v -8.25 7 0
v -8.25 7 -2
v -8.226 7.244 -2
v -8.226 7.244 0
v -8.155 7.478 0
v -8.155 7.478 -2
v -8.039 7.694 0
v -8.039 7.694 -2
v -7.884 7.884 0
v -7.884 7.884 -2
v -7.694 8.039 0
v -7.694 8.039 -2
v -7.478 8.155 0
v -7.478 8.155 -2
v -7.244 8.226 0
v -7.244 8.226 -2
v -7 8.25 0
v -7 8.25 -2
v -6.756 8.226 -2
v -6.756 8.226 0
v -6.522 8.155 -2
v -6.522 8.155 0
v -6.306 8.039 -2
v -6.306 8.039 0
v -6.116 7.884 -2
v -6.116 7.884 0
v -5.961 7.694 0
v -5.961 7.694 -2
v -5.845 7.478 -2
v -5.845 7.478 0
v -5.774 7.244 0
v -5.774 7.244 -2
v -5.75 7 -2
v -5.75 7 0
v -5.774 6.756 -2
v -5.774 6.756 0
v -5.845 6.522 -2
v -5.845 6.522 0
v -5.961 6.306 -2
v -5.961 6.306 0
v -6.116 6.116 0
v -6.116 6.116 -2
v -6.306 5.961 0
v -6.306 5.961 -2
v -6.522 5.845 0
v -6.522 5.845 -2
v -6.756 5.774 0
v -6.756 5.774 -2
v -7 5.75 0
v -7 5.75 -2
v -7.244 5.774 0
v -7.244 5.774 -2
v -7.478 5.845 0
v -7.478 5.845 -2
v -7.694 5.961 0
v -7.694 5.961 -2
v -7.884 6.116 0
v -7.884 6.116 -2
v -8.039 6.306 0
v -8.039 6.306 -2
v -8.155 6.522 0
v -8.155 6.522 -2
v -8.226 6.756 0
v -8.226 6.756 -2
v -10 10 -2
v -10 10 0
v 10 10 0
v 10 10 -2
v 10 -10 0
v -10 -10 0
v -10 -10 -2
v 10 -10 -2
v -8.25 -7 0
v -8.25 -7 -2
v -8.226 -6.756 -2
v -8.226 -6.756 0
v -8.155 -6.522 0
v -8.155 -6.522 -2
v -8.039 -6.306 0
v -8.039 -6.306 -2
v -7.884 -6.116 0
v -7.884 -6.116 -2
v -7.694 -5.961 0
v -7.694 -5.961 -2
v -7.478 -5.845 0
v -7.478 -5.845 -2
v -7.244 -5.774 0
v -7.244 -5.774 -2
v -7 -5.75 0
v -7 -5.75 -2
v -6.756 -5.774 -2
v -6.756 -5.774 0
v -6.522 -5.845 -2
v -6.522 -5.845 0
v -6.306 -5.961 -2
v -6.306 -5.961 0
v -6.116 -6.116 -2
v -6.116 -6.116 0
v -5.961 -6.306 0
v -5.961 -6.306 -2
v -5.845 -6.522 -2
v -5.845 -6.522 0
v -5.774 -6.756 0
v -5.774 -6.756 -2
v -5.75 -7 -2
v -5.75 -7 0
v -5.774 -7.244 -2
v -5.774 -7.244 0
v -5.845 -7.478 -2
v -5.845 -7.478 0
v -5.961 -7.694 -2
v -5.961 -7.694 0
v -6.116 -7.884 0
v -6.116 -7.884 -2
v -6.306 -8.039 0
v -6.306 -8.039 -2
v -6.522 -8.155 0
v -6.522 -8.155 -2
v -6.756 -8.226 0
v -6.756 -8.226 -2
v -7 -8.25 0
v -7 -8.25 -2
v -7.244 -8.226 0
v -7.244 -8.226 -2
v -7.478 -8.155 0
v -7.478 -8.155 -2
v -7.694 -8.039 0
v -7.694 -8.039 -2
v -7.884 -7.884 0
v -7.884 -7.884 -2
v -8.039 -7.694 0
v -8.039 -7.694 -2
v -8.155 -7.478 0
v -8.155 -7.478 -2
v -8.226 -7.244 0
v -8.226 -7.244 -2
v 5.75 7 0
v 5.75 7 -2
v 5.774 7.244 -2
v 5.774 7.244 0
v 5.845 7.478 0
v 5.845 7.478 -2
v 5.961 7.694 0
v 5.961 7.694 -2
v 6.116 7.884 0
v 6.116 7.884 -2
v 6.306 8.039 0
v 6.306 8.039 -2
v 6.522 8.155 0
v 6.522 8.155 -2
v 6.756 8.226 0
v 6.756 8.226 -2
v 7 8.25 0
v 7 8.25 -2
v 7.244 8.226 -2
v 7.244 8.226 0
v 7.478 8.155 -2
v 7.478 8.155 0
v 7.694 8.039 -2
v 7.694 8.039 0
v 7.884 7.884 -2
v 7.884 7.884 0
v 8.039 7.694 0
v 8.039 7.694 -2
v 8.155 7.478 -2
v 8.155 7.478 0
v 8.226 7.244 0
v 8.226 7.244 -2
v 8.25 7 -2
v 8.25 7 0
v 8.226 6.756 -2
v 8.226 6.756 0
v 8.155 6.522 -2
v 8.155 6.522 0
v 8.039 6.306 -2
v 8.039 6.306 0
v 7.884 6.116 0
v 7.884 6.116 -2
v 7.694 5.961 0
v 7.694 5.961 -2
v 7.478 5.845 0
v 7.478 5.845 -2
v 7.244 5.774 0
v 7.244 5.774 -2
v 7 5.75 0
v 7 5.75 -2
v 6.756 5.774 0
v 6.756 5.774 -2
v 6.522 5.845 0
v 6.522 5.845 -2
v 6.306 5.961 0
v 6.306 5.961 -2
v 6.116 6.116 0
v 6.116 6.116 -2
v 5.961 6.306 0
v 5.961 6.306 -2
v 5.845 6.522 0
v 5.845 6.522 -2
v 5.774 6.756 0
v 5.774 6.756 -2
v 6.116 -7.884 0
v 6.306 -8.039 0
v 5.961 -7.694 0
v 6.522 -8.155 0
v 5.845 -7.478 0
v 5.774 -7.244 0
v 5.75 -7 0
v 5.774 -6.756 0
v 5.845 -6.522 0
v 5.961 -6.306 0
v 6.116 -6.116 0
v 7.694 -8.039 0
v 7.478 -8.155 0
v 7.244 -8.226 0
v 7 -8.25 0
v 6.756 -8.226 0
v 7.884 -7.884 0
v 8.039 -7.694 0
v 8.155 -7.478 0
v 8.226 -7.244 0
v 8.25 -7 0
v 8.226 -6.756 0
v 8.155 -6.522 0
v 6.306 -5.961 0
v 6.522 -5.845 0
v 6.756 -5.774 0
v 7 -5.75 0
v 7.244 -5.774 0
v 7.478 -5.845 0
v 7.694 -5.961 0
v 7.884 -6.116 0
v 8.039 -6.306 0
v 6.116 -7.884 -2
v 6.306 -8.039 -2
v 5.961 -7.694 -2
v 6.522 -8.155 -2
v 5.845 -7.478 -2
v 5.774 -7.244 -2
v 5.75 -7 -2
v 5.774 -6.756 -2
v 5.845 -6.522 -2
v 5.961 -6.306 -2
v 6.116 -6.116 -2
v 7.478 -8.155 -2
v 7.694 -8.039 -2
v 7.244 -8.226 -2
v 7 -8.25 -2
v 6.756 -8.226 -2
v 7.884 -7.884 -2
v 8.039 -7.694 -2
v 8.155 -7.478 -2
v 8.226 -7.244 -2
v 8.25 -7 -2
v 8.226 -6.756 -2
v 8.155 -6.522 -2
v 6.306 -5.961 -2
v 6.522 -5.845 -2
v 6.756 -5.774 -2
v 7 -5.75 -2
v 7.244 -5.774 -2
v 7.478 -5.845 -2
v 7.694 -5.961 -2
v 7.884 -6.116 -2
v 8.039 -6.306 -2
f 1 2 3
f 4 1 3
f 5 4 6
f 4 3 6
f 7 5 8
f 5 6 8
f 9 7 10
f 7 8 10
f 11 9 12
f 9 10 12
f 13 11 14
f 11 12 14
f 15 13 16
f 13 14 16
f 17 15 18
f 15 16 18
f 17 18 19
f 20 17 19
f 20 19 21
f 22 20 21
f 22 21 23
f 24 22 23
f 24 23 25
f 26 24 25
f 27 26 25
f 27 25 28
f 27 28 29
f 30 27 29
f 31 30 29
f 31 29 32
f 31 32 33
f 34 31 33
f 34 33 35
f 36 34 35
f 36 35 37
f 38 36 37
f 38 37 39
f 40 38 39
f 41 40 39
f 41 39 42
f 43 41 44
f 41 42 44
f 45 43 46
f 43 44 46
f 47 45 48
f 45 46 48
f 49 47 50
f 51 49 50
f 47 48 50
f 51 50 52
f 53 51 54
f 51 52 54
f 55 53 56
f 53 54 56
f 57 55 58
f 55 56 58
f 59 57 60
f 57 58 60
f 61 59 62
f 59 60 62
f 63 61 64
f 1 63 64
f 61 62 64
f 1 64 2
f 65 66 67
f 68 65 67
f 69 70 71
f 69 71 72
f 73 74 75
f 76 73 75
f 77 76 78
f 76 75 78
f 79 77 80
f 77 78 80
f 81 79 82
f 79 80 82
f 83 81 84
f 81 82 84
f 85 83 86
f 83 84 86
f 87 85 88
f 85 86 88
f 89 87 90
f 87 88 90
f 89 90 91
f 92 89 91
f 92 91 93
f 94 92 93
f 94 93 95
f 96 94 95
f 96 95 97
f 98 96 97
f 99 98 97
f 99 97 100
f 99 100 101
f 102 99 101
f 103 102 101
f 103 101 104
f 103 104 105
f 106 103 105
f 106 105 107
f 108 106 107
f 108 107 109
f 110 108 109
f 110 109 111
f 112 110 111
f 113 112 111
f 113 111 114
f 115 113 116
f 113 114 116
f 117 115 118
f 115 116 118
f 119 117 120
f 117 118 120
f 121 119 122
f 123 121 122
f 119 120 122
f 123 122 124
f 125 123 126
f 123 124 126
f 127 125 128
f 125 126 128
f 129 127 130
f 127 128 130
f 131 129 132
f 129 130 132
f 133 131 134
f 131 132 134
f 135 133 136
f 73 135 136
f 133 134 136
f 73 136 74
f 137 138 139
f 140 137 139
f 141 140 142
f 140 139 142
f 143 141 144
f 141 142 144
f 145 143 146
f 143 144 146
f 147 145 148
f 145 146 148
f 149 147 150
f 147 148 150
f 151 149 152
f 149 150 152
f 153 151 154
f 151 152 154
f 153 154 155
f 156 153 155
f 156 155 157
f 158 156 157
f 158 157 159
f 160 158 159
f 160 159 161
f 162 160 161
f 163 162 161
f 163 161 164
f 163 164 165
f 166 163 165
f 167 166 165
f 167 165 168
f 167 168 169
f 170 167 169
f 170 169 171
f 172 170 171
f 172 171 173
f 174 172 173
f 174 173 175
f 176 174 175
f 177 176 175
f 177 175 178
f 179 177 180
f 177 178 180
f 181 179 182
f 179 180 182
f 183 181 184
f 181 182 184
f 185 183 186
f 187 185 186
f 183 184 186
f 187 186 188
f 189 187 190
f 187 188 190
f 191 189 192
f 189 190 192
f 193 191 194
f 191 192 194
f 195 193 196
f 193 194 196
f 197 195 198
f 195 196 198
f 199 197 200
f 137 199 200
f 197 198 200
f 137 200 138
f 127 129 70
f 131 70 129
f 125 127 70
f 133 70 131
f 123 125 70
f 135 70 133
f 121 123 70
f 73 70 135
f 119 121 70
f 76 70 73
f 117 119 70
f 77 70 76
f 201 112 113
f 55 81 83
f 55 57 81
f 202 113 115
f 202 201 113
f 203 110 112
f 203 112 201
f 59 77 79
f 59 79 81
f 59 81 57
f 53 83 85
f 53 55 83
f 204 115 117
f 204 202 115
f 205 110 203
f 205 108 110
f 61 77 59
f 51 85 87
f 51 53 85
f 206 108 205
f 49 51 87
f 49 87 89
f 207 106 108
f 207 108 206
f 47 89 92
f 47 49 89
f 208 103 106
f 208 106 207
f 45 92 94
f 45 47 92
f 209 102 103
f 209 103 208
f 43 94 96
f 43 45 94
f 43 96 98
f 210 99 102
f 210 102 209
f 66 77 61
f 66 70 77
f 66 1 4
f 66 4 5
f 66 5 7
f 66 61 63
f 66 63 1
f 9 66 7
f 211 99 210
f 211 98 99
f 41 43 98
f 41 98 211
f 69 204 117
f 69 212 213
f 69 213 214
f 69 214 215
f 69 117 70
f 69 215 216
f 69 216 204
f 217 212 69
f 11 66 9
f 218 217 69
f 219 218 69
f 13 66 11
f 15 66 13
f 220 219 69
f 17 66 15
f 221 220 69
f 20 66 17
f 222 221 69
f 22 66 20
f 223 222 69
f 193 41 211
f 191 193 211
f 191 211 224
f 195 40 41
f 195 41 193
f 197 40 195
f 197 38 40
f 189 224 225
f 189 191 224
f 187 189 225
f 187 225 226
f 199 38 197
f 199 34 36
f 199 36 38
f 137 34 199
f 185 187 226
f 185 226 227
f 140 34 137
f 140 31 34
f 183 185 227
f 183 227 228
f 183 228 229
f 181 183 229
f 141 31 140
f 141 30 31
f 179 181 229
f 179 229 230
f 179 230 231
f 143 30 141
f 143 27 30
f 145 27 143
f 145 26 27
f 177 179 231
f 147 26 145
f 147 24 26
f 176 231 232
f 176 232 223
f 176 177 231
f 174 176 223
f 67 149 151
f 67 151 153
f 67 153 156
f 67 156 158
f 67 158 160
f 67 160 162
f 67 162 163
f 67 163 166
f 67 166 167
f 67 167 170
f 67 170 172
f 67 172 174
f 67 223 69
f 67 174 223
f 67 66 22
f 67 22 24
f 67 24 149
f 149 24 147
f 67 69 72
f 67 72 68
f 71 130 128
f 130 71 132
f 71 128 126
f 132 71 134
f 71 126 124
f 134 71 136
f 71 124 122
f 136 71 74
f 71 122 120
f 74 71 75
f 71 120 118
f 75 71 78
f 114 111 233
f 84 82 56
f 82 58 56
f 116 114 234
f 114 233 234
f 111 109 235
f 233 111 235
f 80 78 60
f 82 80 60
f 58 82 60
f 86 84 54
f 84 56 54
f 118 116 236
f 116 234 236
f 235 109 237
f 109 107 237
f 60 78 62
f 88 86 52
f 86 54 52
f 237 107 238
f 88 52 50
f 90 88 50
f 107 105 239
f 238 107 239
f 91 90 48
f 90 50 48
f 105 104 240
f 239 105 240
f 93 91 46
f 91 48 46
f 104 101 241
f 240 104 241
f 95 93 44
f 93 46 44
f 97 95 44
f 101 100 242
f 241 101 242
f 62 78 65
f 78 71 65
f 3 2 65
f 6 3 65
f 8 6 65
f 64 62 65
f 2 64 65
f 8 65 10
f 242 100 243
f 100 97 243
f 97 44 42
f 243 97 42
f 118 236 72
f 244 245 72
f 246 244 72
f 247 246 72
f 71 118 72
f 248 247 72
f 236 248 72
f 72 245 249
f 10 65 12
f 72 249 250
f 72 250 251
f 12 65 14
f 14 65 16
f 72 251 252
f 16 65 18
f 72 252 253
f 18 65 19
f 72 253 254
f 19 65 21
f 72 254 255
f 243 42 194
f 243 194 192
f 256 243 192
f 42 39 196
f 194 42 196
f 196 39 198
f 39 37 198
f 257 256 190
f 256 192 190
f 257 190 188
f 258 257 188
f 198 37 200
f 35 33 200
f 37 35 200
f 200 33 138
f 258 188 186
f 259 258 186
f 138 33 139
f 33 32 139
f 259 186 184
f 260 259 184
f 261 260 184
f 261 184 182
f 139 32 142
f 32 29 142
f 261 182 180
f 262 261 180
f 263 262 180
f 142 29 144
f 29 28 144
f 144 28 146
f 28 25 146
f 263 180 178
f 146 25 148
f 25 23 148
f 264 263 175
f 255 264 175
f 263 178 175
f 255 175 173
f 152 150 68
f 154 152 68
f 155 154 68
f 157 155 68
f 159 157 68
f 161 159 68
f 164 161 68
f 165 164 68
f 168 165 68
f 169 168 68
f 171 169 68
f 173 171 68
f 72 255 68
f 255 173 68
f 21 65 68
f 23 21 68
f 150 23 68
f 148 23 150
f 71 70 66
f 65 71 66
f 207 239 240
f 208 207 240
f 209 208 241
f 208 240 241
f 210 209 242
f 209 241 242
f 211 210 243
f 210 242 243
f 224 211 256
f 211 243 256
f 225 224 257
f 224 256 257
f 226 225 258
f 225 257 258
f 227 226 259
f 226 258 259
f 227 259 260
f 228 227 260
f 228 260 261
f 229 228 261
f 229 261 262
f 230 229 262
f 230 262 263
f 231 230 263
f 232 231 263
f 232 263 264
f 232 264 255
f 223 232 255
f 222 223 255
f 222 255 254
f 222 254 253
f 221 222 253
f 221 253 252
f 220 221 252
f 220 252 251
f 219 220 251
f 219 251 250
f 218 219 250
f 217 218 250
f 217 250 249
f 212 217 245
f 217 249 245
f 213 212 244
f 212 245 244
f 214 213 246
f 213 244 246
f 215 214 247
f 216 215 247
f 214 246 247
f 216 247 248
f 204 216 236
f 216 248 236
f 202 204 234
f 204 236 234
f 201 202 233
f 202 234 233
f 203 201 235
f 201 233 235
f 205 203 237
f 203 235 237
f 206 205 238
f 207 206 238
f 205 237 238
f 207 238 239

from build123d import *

# Parameters (mm, degrees)
F0_W     = 20
F0_H     = 20
F1_DEPTH = 2
F3_D     = 2.5


with BuildPart() as f1:
    # F0 (on Top) → F1 (new body)
    with BuildSketch(Plane.XY):
        Rectangle(F0_W, F0_H)
    extrude(amount=-F1_DEPTH)

    # F3 (through all)
    with Locations(Plane.XY):
        with Locations((-7, 7), (7, 7), (-7, -7), (7, -7)):
            Hole(F3_D / 2)


solid = f1.part
